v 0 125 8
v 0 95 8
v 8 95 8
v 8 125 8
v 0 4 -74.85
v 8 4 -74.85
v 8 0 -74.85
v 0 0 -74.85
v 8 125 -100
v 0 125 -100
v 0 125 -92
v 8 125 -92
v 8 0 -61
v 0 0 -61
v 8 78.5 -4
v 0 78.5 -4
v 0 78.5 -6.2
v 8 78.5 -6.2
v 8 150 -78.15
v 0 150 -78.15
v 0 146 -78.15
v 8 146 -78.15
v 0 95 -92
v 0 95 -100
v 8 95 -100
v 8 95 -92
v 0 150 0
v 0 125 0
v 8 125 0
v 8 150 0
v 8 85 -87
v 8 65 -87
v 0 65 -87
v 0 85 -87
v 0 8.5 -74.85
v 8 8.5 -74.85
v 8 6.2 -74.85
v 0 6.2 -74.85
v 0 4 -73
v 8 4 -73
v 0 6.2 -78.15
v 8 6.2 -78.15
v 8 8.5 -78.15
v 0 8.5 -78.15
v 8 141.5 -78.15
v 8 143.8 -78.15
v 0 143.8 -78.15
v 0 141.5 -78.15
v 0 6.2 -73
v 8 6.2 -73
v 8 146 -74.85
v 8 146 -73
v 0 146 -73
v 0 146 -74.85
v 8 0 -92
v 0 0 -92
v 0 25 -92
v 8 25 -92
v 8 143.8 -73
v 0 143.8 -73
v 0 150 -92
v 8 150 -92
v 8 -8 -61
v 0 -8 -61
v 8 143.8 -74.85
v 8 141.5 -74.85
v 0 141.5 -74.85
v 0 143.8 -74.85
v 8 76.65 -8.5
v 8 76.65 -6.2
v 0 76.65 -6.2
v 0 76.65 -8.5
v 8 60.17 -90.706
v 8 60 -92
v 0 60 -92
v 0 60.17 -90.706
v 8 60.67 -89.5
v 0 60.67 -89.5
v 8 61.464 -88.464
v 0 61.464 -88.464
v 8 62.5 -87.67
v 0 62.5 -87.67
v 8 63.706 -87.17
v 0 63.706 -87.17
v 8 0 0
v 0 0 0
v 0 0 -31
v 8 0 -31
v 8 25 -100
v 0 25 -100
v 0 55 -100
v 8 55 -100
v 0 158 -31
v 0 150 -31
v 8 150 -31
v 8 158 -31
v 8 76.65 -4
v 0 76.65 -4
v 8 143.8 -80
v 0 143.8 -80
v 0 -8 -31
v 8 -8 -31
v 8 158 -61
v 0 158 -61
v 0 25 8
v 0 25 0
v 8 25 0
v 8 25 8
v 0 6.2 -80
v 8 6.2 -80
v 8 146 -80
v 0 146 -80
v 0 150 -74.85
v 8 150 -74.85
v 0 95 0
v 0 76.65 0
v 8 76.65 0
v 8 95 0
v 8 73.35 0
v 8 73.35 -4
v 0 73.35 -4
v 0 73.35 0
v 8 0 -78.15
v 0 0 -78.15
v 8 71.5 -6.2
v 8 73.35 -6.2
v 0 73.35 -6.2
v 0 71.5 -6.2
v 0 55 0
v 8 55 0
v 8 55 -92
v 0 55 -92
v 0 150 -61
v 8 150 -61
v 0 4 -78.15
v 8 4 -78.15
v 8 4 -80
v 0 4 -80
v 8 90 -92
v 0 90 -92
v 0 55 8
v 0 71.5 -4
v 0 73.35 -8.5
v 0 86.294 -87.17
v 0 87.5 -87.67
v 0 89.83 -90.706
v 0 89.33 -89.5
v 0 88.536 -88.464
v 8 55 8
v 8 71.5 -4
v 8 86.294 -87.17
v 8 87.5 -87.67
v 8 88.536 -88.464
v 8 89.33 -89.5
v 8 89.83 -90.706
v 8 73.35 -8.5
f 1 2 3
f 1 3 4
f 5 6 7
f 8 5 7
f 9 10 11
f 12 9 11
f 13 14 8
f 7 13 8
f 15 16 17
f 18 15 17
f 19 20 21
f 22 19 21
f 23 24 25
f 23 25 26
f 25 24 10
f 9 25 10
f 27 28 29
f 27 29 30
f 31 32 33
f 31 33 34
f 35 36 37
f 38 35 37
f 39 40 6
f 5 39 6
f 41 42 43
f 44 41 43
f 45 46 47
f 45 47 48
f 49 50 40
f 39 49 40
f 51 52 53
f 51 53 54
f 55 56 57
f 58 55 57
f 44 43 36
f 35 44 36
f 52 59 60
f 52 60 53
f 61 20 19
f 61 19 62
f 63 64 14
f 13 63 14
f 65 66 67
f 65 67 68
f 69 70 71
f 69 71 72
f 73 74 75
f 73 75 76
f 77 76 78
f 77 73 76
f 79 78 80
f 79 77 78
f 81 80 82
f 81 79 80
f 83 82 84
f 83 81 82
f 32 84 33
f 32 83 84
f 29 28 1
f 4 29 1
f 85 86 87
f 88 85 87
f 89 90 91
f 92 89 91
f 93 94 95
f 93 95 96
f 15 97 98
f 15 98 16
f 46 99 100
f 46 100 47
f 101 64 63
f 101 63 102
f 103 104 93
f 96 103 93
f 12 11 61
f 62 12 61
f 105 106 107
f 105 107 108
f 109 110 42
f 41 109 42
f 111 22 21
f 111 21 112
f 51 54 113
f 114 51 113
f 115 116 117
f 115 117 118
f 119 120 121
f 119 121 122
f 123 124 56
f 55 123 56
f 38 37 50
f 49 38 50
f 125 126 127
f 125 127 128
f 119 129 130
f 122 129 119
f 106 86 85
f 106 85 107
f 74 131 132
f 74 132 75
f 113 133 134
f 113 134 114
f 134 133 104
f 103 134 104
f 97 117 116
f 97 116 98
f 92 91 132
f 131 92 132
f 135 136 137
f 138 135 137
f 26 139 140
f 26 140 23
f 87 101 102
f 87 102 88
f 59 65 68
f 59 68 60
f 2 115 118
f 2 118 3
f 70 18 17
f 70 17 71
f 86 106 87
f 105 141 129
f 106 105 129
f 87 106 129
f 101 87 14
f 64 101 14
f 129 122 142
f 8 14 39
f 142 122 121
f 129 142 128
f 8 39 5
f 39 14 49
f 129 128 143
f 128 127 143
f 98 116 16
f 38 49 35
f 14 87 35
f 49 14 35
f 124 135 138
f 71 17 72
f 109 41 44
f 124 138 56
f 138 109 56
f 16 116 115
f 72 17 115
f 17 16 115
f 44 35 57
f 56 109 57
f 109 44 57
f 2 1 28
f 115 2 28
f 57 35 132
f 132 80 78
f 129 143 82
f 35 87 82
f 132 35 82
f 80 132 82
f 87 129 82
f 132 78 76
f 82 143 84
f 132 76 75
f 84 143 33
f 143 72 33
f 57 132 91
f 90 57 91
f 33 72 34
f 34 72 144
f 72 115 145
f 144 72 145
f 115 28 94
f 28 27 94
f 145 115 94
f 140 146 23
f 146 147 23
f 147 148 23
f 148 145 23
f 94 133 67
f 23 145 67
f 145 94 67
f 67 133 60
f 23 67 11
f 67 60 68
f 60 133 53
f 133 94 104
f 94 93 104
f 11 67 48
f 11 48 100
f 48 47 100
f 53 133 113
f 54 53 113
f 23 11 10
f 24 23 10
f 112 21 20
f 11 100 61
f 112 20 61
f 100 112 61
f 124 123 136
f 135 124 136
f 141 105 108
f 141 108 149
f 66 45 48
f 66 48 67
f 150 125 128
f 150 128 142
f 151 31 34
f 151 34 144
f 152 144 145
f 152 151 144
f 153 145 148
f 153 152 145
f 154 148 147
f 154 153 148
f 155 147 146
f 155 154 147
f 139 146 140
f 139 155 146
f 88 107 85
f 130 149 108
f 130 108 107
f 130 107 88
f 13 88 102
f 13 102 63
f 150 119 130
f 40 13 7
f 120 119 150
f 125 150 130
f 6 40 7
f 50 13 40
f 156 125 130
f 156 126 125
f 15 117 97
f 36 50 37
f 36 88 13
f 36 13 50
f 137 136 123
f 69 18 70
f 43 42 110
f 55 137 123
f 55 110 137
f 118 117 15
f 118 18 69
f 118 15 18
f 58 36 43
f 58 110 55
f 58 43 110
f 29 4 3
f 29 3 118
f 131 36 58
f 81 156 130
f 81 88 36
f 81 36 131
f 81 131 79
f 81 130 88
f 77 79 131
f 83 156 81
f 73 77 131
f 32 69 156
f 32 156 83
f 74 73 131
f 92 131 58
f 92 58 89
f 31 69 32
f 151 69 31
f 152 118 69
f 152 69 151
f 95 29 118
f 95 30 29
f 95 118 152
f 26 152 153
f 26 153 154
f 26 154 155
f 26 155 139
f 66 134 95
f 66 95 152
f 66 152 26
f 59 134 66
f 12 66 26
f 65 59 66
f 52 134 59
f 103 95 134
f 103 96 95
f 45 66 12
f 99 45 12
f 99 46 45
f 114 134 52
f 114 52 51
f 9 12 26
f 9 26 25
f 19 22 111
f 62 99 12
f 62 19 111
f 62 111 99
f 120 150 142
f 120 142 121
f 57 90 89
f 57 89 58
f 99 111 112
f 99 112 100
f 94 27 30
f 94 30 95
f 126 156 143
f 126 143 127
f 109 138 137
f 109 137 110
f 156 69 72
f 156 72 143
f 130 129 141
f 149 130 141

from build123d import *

# Parameters (mm, degrees)
SKETCH1_W           = 92
SKETCH1_H           = 150
BOSS_EXTRUDE1_DEPTH = 8
SKETCH2_W           = 30
SKETCH2_H           = 8
SKETCH2_W_2         = 8
SKETCH2_H_2         = 30
BOSS_EXTRUDE2_DEPTH = 8
CUT_EXTRUDE2_DEPTH  = 9


with BuildPart() as part:
    # Sketch1 → Boss-Extrude1 (new body)
    with BuildSketch(Plane(origin=(0, 0, 0), x_dir=(0, 0, -1), z_dir=(1, 0, 0))):
        with Locations((46, 75)):
            Rectangle(SKETCH1_W, SKETCH1_H)
    extrude(amount=BOSS_EXTRUDE1_DEPTH)

    # Sketch2 → Boss-Extrude2 (add)
    with BuildSketch(Plane.ZY):
        with Locations((-46, 154)):
            Rectangle(SKETCH2_W, SKETCH2_H)
        with Locations((-46, -4)):
            Rectangle(SKETCH2_W, SKETCH2_H)
        with Locations((4, 40)):
            Rectangle(SKETCH2_W_2, SKETCH2_H_2)
        with Locations((4, 110)):
            Rectangle(SKETCH2_W_2, SKETCH2_H_2)
        with Locations((-96, 40)):
            Rectangle(SKETCH2_W_2, SKETCH2_H_2)
        with Locations((-96, 110)):
            Rectangle(SKETCH2_W_2, SKETCH2_H_2)
    extrude(amount=-BOSS_EXTRUDE2_DEPTH)

    # Sketch4 → Cut-Extrude2 (cut, through all)
    with BuildSketch(Plane(origin=(8, 0, 0), x_dir=(0, 0, -1), z_dir=(1, 0, 0))):
        with BuildLine():
            Line((97, 85), (97, 65))
            ThreePointArc((97, 65), (92, 60), (87, 65))
            Line((87, 65), (87, 85))
            ThreePointArc((87, 85), (92, 90), (97, 85))
        make_face()
        Polygon((0, 76.65), (4, 76.65), (4, 78.5), (6.2, 78.5), (6.2, 76.65), (8.5, 76.65), (8.5, 73.35), (6.2, 73.35), (6.2, 71.5), (4, 71.5), (4, 73.35), (0, 73.35), align=None)
        Polygon((78.15, 0), (78.15, 4), (80, 4), (80, 6.2), (78.15, 6.2), (78.15, 8.5), (74.85, 8.5), (74.85, 6.2), (73, 6.2), (73, 4), (74.85, 4), (74.85, 0), align=None)
        Polygon((74.85, 150), (78.15, 150), (78.15, 146), (80, 146), (80, 143.8), (78.15, 143.8), (78.15, 141.5), (74.85, 141.5), (74.85, 143.8), (73, 143.8), (73, 146), (74.85, 146), align=None)
    extrude(amount=-CUT_EXTRUDE2_DEPTH, mode=Mode.SUBTRACT)


solid = part.part
